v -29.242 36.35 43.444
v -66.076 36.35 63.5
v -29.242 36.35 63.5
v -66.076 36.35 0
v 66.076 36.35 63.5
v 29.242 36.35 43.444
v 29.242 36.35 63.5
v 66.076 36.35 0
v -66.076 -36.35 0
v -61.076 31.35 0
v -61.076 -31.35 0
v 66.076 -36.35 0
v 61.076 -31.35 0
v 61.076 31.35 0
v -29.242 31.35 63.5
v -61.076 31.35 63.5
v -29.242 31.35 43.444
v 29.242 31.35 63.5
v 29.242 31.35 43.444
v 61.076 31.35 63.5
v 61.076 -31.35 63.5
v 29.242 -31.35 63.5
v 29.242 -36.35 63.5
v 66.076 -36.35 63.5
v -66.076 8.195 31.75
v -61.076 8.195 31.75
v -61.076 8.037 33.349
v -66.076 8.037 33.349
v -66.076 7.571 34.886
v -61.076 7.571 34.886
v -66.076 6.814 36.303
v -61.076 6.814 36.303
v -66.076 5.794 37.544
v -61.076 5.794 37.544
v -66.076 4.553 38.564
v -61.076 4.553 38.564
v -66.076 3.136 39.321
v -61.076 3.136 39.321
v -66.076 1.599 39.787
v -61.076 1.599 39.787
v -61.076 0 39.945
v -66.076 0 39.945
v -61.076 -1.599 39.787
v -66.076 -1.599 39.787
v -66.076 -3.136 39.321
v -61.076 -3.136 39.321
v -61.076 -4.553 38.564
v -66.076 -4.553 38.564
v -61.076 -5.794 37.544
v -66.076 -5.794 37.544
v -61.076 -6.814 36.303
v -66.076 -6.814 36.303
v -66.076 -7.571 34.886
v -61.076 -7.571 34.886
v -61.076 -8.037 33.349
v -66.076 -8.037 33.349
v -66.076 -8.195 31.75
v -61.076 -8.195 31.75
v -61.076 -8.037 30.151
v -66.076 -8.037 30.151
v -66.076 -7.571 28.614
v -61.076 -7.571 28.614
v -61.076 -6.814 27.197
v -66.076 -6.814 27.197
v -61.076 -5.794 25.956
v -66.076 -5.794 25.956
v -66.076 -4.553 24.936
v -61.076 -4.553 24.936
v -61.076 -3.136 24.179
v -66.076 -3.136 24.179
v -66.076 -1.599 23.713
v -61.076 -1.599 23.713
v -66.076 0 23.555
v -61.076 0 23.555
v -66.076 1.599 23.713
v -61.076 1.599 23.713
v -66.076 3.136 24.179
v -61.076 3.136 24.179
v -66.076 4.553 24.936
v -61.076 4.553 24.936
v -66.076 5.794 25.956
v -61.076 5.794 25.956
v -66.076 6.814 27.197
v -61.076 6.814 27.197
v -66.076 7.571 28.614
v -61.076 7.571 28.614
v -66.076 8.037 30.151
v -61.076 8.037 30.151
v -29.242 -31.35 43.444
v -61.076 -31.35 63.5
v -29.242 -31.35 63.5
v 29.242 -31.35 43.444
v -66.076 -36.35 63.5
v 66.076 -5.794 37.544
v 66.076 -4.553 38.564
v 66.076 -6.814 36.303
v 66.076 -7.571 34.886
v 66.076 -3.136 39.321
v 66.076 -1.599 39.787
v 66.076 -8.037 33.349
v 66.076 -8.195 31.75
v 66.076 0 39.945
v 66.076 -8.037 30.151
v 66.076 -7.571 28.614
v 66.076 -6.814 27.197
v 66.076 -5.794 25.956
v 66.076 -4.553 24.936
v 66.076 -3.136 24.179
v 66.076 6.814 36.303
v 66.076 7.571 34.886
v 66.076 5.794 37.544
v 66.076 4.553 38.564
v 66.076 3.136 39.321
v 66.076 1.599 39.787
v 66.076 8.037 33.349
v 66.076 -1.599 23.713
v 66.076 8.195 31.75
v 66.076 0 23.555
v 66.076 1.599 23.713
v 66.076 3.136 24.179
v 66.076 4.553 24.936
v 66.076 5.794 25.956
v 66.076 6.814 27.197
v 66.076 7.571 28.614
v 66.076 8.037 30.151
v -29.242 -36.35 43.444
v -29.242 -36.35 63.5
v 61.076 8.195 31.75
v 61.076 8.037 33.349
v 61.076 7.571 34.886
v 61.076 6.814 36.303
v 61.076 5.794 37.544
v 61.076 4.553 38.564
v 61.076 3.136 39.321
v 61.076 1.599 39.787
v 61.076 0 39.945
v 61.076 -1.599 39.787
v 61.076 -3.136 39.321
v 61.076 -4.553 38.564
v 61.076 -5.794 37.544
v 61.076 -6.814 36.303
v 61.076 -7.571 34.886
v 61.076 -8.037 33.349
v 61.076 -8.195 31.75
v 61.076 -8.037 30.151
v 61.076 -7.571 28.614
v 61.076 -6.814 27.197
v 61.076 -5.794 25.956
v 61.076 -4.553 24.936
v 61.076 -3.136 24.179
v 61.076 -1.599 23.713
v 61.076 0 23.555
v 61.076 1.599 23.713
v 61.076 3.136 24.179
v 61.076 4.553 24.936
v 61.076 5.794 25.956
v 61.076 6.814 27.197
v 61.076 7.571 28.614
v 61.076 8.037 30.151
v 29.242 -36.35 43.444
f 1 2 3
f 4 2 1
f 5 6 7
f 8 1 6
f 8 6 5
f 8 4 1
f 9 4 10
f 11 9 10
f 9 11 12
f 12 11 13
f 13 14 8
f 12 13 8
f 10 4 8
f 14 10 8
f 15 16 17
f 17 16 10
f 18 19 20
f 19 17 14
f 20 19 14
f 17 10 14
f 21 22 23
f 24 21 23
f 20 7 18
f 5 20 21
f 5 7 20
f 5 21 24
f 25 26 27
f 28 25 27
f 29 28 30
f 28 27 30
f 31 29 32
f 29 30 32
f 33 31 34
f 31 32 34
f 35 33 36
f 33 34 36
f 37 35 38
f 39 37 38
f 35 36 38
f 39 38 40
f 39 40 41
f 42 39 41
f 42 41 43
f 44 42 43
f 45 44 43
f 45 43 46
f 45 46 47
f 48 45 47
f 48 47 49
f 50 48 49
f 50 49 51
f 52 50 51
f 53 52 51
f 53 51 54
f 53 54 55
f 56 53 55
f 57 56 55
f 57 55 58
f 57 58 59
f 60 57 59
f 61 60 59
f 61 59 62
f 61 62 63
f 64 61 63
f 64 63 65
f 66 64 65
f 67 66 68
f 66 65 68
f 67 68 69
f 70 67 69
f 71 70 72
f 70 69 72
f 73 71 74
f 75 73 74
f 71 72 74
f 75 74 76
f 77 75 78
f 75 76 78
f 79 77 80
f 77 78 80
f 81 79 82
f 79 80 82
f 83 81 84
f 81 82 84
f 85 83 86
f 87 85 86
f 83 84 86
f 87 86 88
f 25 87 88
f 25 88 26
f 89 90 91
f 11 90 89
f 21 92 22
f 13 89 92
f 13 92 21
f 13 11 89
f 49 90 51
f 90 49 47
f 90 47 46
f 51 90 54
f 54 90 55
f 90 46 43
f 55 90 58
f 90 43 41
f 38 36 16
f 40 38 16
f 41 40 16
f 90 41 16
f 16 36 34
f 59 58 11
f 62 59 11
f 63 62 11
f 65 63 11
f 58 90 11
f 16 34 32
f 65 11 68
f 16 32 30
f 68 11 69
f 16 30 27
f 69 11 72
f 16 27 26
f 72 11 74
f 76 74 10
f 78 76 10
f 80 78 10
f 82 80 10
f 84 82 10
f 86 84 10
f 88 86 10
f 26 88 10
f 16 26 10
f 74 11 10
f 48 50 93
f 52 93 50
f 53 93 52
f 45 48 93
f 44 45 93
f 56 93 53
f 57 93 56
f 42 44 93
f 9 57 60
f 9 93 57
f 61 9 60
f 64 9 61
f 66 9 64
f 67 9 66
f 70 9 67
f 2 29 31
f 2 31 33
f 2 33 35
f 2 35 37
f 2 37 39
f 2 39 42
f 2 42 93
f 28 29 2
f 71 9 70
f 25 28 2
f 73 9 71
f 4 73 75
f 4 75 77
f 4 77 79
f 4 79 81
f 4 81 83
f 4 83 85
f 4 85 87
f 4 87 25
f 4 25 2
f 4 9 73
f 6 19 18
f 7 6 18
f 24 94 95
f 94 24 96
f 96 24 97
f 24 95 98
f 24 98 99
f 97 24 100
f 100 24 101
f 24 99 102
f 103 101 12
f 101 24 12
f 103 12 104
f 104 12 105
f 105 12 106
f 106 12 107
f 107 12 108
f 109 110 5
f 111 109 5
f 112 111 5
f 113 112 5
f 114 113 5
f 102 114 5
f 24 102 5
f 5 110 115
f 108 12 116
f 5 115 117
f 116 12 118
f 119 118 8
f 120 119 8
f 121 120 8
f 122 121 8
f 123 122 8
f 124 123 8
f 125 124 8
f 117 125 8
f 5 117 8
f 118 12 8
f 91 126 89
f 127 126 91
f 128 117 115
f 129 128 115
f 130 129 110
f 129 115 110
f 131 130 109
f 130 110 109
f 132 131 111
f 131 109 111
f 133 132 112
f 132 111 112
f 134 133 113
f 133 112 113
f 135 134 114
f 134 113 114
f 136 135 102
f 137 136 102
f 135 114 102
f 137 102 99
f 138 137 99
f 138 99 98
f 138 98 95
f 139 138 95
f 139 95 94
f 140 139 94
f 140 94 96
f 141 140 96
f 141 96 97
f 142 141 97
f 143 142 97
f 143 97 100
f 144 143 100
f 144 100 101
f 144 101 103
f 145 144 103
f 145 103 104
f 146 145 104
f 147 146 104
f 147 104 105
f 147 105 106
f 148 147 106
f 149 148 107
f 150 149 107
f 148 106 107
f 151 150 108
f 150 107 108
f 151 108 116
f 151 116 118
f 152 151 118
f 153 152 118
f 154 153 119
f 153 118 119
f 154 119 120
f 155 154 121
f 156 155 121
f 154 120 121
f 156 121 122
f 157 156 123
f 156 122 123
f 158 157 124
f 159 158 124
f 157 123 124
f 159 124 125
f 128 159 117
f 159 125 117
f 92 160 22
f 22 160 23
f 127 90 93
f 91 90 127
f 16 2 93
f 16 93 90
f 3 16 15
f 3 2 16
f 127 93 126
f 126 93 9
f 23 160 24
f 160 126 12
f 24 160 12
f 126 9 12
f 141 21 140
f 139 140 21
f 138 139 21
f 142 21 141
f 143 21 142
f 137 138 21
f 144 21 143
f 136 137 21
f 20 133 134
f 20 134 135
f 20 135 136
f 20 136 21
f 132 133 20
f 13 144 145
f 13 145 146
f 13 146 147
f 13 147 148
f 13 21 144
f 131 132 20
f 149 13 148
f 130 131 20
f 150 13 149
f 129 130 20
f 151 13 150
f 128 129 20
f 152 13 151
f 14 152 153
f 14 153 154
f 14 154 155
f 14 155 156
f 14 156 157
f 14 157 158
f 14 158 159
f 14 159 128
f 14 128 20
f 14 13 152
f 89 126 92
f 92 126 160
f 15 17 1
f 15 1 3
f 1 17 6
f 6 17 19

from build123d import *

# Parameters (mm, degrees)
F0_W     = 132.152318
F0_H     = 72.699182
F0_W_2   = 122.152318
F0_H_2   = 62.699182
F1_DEPTH = 63.5
F2_R     = 8.194556
F3_DEPTH = 132.153319
F4_W     = 58.48376
F4_H     = 20.056372
F5_DEPTH = 72.700182


with BuildPart() as f1:
    # F0 (on Top) → F1 (new body)
    with BuildSketch(Plane.XY):
        Rectangle(F0_W, F0_H)
        Rectangle(F0_W_2, F0_H_2, mode=Mode.SUBTRACT)
    extrude(amount=F1_DEPTH)

    # F2 (on face) → F3 (cut, through all)
    with BuildSketch(Plane.YZ.offset(66.076159)):
        with Locations((0, 31.75)):
            Circle(F2_R)
    extrude(amount=-F3_DEPTH, mode=Mode.SUBTRACT)

    # F4 (on face) → F5 (cut, through all)
    with BuildSketch(Plane.XZ.offset(36.349591)):
        with Locations((0, 53.471814)):
            Rectangle(F4_W, F4_H)
    extrude(amount=-F5_DEPTH, mode=Mode.SUBTRACT)


solid = f1.part
